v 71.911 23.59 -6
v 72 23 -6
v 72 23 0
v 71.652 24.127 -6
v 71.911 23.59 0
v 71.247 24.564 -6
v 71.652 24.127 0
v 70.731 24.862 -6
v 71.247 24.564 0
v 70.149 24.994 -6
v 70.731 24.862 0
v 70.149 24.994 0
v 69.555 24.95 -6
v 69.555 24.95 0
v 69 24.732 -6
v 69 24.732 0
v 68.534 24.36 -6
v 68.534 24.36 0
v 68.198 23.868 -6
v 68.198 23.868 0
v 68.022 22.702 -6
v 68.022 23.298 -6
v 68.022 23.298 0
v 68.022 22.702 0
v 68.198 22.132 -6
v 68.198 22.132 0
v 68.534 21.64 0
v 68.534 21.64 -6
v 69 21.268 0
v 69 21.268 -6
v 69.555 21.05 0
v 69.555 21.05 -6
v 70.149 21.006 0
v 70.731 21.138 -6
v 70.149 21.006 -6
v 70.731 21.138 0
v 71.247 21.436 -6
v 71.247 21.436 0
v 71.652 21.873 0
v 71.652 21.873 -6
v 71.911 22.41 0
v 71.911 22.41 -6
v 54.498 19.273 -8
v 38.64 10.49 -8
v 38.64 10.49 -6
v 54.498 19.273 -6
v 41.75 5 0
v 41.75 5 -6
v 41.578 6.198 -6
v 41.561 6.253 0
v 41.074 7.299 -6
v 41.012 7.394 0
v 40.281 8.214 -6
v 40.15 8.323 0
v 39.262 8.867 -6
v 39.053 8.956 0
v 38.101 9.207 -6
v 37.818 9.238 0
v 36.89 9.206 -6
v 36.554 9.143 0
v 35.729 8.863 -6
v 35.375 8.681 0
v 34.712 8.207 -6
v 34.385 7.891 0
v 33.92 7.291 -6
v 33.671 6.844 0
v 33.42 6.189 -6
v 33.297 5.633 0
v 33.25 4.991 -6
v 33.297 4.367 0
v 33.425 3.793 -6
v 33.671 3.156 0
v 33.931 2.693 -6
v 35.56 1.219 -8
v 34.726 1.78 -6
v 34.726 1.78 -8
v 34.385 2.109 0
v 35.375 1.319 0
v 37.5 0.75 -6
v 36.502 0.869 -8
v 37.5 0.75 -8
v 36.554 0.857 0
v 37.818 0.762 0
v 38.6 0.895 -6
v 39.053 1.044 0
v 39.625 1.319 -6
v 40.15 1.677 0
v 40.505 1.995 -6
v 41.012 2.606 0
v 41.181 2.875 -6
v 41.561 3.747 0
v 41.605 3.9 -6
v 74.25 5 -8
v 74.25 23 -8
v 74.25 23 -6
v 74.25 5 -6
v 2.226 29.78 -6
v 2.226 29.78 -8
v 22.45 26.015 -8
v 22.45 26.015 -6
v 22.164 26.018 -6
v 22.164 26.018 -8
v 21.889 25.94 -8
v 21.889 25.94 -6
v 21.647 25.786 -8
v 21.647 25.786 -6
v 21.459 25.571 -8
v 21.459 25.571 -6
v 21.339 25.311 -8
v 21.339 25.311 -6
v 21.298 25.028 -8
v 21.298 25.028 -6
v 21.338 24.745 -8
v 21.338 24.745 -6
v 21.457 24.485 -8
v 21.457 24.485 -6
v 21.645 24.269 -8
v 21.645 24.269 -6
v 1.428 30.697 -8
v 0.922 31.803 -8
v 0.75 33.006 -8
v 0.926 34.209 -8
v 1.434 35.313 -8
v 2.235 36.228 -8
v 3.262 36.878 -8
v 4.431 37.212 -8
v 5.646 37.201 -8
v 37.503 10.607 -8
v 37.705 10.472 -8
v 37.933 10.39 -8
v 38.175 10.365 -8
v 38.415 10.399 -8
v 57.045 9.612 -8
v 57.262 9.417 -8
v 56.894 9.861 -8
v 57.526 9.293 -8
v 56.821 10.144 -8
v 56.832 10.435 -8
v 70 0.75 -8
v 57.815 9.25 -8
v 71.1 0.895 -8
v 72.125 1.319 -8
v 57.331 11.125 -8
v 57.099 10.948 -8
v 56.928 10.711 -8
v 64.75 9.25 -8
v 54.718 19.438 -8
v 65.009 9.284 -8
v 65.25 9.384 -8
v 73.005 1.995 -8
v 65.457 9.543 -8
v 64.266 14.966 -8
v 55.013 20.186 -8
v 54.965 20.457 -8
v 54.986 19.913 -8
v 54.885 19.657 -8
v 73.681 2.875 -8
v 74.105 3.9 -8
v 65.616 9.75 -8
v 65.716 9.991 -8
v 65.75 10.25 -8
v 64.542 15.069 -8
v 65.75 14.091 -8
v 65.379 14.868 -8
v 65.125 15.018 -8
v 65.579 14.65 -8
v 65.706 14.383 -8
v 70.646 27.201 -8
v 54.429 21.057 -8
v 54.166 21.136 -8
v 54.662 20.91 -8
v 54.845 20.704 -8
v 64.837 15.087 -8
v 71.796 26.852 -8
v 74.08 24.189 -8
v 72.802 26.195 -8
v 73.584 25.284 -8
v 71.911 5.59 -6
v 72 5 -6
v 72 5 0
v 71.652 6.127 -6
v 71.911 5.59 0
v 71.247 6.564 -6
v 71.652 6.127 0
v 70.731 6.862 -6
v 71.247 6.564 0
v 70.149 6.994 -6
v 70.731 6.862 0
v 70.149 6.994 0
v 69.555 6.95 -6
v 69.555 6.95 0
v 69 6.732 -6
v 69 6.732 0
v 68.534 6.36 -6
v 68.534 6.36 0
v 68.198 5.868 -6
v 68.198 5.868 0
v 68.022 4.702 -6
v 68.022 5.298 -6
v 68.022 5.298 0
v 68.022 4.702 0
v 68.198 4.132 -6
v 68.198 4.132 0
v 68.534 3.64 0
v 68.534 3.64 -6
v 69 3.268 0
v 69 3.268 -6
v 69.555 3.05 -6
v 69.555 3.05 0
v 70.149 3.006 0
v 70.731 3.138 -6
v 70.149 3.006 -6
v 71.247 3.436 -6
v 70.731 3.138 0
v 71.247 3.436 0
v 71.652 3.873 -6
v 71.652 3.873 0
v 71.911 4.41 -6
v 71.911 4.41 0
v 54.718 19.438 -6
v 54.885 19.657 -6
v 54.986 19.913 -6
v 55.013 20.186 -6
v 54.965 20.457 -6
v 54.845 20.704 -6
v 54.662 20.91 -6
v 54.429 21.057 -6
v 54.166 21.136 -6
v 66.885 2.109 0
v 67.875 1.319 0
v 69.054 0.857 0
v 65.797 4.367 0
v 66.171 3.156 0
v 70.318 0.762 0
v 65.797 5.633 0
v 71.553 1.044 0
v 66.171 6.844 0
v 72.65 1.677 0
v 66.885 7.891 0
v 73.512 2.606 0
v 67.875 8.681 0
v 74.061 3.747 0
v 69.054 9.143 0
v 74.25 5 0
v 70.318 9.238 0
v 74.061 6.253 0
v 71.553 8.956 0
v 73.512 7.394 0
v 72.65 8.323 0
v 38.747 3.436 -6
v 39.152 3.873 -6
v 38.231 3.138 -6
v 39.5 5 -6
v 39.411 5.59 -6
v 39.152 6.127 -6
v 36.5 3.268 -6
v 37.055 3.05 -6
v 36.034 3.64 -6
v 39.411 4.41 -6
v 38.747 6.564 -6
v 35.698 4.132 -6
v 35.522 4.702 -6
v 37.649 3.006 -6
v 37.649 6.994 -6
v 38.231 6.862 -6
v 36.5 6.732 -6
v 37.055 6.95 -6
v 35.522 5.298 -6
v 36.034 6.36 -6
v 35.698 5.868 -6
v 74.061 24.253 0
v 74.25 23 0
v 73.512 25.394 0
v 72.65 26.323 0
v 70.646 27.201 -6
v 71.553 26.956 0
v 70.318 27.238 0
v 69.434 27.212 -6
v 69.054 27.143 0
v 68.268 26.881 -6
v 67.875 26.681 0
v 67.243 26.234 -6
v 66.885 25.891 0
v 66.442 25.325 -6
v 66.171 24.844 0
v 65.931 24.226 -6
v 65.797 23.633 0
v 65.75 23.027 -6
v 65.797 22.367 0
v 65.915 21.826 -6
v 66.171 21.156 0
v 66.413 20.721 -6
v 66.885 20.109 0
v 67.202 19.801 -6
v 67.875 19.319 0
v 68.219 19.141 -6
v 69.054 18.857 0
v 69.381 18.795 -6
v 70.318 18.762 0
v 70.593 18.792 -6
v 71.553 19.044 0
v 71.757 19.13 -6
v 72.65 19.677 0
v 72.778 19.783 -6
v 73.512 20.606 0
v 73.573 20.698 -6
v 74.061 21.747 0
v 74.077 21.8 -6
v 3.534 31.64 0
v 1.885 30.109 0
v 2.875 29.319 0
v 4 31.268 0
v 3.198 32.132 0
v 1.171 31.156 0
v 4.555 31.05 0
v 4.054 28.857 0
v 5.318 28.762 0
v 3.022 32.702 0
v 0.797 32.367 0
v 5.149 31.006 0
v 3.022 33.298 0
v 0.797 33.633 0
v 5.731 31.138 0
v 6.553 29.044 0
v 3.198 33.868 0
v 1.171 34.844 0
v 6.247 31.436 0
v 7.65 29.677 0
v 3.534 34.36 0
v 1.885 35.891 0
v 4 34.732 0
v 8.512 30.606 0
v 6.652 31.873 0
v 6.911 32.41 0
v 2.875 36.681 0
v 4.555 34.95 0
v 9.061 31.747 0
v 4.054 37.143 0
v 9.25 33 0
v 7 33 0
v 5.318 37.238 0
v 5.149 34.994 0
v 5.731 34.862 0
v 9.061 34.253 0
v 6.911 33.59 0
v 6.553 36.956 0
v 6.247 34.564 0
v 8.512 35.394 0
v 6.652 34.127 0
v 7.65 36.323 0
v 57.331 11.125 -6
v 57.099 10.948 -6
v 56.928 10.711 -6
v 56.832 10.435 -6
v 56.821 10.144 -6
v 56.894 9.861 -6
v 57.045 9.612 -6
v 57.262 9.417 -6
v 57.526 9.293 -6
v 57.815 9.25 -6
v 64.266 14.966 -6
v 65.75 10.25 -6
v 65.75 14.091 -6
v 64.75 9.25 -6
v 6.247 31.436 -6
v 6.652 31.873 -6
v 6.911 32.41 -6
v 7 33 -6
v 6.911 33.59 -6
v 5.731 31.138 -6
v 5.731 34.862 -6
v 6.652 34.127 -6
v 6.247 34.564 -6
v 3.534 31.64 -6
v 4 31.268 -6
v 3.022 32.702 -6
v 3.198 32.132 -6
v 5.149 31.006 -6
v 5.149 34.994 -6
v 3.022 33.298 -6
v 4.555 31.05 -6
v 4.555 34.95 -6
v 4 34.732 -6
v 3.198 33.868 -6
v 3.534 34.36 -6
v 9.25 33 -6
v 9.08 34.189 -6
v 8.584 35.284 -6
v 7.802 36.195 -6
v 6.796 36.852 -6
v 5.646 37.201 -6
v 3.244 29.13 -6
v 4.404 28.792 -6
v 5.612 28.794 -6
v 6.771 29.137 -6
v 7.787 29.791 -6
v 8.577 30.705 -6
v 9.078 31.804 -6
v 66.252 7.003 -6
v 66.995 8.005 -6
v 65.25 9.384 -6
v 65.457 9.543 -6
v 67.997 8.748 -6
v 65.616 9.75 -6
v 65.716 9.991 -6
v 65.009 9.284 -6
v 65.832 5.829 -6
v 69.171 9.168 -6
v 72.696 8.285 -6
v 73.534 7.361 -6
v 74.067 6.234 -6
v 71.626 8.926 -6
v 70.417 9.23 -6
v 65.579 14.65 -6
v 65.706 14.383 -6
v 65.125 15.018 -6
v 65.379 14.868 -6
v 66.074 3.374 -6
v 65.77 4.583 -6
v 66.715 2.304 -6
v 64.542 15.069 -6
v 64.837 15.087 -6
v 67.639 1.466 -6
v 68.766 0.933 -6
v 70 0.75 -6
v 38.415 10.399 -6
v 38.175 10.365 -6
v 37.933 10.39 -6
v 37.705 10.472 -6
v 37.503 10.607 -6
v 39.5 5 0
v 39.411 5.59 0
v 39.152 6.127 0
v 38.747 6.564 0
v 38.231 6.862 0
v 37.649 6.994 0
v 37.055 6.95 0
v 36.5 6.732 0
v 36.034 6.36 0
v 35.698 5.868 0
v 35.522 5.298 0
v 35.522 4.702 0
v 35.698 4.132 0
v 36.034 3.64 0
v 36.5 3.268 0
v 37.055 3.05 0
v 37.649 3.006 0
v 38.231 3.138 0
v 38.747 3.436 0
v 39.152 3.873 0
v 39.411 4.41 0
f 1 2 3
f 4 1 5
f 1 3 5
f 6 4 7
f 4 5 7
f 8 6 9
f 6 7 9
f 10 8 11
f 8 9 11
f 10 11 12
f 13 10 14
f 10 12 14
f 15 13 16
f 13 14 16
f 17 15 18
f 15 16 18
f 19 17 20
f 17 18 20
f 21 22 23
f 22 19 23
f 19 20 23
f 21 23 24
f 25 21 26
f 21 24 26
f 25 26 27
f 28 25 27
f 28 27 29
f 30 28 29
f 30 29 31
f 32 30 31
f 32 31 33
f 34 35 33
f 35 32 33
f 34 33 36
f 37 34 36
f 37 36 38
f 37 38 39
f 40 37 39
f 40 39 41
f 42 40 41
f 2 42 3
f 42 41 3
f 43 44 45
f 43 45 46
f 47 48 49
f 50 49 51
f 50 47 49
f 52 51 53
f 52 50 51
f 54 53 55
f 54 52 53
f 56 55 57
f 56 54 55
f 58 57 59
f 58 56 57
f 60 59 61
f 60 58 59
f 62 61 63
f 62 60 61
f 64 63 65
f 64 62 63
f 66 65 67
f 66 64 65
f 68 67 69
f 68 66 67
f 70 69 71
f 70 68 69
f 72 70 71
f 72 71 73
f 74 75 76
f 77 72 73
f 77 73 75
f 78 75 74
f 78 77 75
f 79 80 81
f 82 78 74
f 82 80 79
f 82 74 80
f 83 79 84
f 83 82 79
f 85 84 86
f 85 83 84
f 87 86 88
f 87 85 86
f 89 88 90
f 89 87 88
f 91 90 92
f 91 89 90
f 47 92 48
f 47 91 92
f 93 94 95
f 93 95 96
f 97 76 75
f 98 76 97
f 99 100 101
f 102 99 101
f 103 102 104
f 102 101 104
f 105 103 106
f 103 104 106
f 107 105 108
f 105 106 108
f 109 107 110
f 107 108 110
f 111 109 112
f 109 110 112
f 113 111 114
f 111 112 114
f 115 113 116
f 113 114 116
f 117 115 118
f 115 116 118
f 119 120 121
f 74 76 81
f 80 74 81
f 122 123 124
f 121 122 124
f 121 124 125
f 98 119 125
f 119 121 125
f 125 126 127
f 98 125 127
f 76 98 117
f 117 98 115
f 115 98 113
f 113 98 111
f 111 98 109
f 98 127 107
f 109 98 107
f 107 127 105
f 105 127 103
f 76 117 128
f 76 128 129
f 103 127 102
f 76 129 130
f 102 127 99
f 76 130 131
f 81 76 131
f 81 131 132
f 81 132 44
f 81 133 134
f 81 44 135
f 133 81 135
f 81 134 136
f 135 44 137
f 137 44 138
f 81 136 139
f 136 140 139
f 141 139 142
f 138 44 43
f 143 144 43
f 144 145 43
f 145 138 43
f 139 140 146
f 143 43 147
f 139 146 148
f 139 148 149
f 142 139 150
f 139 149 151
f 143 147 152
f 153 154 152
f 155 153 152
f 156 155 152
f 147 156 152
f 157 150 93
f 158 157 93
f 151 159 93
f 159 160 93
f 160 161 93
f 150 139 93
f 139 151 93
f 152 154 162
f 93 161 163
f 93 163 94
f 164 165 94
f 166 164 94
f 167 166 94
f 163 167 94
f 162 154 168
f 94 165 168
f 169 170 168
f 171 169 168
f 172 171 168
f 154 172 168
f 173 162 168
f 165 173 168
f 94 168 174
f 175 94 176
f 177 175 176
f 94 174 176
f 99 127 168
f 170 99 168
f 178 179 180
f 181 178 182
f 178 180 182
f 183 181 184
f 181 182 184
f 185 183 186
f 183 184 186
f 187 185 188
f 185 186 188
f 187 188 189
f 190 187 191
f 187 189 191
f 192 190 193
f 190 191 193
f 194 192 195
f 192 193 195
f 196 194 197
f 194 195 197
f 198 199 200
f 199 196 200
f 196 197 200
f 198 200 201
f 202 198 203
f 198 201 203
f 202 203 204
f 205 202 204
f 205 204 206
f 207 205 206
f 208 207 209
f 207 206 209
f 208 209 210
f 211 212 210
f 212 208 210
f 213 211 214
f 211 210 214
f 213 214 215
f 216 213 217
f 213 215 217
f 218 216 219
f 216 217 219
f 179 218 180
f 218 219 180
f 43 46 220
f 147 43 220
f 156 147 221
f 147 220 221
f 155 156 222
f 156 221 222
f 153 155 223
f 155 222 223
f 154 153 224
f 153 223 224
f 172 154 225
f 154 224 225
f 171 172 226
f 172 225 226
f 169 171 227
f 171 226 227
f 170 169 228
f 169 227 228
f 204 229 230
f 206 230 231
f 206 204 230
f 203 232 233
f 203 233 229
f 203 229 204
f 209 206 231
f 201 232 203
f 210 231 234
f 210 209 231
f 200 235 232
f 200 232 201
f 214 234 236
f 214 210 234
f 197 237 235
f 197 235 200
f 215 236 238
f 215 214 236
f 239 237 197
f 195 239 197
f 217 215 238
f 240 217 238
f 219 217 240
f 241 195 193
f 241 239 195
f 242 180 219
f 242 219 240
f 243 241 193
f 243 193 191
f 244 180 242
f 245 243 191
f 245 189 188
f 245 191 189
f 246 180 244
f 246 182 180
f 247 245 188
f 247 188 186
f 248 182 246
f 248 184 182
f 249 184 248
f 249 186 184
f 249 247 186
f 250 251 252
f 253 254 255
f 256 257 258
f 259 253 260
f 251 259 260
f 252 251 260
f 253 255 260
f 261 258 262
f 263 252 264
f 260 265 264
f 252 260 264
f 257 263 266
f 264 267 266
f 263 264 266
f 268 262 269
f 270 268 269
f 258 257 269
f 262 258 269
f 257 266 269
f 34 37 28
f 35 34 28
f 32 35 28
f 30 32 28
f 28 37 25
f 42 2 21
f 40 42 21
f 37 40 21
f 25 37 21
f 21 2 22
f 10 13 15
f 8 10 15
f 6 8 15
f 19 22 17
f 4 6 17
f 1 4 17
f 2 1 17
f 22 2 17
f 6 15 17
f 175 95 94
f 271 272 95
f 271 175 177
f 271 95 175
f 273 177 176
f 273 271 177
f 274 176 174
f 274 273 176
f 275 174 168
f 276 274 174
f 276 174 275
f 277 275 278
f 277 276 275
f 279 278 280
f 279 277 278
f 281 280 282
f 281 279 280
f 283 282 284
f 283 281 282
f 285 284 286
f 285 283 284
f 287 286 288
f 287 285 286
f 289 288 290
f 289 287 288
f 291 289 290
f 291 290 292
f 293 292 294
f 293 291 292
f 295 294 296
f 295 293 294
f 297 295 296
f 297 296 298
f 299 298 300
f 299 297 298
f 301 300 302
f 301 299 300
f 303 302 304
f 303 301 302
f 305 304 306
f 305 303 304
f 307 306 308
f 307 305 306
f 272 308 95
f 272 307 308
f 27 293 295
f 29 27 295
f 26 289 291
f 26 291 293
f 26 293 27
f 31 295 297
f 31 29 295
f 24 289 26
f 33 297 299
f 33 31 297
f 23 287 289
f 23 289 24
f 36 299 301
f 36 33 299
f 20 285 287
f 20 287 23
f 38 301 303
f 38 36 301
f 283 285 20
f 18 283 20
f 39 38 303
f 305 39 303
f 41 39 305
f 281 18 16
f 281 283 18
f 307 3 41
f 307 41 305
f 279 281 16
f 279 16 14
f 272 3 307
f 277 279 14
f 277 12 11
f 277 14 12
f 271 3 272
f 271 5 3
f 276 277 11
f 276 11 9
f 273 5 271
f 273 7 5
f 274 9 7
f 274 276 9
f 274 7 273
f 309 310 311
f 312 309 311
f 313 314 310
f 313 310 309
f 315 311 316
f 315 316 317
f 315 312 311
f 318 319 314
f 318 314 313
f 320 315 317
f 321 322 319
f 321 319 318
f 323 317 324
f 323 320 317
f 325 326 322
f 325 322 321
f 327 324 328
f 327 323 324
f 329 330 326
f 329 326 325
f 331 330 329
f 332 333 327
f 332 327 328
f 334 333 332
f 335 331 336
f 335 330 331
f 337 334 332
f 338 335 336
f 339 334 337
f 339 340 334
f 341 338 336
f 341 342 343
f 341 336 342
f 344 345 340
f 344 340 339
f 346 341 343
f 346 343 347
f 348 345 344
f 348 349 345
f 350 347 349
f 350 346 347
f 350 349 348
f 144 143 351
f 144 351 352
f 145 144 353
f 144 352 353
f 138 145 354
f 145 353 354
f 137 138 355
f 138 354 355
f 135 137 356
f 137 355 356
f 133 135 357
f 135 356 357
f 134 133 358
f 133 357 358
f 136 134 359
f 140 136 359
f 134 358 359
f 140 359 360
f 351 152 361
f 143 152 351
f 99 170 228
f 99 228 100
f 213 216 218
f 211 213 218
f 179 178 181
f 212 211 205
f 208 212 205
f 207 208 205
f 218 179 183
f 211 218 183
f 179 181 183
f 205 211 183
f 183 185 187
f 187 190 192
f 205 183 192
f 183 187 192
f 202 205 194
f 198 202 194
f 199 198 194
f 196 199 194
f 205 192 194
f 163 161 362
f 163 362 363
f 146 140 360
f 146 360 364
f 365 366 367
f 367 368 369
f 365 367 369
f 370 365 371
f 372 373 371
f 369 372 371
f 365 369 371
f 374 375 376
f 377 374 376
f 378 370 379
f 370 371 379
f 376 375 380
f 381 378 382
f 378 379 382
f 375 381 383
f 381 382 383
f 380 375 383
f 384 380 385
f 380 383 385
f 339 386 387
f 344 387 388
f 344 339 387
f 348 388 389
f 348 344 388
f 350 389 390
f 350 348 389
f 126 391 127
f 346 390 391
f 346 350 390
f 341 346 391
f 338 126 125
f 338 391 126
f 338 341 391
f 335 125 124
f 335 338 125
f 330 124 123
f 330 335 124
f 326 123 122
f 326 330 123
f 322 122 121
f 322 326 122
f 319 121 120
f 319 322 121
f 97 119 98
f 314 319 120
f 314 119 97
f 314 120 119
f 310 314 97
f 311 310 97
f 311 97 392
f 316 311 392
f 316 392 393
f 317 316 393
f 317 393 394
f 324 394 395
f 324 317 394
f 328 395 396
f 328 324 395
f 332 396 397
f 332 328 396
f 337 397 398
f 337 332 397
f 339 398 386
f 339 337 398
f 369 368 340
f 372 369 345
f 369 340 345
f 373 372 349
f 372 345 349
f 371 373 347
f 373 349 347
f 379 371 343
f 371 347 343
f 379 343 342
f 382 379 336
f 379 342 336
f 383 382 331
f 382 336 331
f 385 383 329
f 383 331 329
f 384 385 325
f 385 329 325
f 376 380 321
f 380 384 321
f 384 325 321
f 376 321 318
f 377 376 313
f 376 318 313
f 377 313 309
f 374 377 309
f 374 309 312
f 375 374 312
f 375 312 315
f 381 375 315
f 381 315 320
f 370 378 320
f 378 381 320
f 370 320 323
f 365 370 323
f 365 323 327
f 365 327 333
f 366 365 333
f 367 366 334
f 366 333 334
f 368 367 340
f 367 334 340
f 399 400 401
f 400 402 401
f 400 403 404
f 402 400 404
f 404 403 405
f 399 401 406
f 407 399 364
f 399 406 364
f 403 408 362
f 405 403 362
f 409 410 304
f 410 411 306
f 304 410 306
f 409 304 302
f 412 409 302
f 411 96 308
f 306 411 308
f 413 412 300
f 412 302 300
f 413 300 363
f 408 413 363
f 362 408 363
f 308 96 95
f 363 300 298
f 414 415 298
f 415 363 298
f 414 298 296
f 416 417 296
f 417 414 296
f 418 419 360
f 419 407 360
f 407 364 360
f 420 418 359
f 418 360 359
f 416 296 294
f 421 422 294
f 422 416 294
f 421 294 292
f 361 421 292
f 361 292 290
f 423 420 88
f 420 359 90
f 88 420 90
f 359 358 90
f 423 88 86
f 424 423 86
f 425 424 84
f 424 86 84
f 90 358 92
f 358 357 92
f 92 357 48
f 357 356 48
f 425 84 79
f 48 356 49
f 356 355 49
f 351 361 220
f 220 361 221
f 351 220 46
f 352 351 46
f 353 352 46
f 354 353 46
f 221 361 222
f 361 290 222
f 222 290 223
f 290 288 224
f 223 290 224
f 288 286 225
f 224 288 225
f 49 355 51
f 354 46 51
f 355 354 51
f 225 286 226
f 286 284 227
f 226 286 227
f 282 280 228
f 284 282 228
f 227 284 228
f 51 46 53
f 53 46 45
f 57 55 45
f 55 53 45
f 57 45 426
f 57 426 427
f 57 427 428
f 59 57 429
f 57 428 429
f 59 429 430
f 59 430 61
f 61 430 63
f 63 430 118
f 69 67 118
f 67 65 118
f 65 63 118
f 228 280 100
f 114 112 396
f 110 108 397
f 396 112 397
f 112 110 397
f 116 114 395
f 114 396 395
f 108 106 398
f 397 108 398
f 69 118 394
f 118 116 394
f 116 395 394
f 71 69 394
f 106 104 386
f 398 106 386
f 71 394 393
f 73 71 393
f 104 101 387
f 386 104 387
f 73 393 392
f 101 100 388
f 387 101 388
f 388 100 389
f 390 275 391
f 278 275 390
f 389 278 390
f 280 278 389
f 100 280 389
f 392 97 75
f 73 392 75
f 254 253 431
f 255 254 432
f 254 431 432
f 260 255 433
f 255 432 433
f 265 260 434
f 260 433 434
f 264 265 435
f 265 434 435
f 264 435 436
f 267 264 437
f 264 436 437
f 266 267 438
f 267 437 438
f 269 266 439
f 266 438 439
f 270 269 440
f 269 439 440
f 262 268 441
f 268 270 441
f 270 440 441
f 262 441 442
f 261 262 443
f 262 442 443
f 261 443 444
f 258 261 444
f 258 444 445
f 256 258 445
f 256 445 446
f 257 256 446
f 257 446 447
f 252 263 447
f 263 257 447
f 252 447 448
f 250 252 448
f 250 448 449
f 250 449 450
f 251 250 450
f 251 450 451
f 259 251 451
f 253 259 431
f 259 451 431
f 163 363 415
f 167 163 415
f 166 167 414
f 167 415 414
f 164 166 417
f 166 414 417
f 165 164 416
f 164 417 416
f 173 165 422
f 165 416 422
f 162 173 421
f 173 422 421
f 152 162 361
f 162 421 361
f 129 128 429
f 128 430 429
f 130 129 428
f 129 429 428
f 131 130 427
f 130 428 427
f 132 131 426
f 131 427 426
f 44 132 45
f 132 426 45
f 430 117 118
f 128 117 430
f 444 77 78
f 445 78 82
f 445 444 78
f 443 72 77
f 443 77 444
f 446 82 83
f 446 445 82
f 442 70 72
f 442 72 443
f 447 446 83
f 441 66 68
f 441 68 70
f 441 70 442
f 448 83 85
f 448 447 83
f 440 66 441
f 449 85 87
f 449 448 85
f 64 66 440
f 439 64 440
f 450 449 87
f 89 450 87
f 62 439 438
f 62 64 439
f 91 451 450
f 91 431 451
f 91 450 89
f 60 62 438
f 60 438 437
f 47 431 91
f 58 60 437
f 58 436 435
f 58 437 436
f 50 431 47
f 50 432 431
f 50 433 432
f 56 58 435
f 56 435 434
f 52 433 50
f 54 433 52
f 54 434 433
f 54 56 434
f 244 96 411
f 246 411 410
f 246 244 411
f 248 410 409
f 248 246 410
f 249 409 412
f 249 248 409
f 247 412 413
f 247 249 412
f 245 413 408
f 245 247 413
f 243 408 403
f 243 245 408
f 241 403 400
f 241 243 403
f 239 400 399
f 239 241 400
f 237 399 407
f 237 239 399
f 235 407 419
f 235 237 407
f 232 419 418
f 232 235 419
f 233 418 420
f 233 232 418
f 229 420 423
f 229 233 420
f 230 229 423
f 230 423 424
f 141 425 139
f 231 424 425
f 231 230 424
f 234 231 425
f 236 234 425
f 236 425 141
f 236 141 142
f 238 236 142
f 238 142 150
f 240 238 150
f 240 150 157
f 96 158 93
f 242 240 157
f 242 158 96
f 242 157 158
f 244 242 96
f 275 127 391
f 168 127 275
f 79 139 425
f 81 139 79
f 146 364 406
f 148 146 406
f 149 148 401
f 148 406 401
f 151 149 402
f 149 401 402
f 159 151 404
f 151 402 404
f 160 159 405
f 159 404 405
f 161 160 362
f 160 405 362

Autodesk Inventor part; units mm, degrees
ref_plane "YZ Plane" through (0, 0, 0) normal (1, 0, 0) x (0, 1, 0)
ref_plane "XZ Plane" through (0, 0, 0) normal (0, 1, 0) x (-1, 0, 0)
ref_plane "XY Plane" through (0, 0, 0) normal (0, 0, 1) x (1, 0, 0)
sketch "Skizze1" plane through (0, 0, 0) normal (0, 0, 1) x (1, 0, 0)
  circle A0 centre (5, 33) radius 4.25
  circle A1 centre (37.5, 5) radius 4.25
  circle A2 centre (70, 23) radius 4.25
  circle A3 centre (70, 5) radius 4.25
  circle A4 centre (5, 33) radius 2
  circle A5 centre (37.5, 5) radius 2
  circle A6 centre (70, 5) radius 2
  circle A7 centre (70, 23) radius 2
  point P0 (0, 0)
  dimension "d0" = 8.5
  dimension "d1" = 33
  dimension "d2" = 5
  dimension "d3" = 8.5
  dimension "d4" = 5
  dimension "d5" = 37.5
  dimension "d6" = 8.5
  dimension "d7" = 70
  dimension "d8" = 23
  dimension "d9" = 8.5
  dimension "d10" = 70
  dimension "d11" = 5
  dimension "d12" = 4
  dimension "d13" = 4
  dimension "d14" = 4
  dimension "d15" = 4
extrude "Extrusion1" add sketch "Skizze1" against normal blind 8
sketch "Skizze2" plane through (70, 23, -8) normal (0, 0, -1) x (-1, 0, 0)
  circle A0 centre (0, 0) radius 2 projected
  circle A1 centre (0, 0) radius 4.25 projected
  circle A2 centre (0, 0) radius 2 projected
  circle A3 centre (0, -18) radius 4.25 projected
  circle A4 centre (0, -18) radius 2 projected
  circle A5 centre (32.5, -18) radius 4.25 projected
  circle A6 centre (32.5, -18) radius 2 projected
  circle A7 centre (65, 10) radius 4.25 projected
  circle A8 centre (65, 10) radius 2 projected
  line L0 (0, 0) -> (0, -18) construction
  line L1 (-4.25, 0) -> (-4.25, -18)
  line L2 (4.25, -18) -> (4.25, 0)
  arc A9 (4.25, 0) -> (-4.25, 0) centre (0, 0) ccw
  arc A10 (-4.25, -18) -> (4.25, -18) centre (0, -18) ccw
  line L3 (0, -18) -> (32.5, -18) construction
  line L4 (0, -22.25) -> (32.5, -22.25)
  line L5 (32.5, -13.75) -> (0, -13.75)
  arc A11 (0, -13.75) -> (0, -22.25) centre (0, -18) ccw
  arc A12 (32.5, -22.25) -> (32.5, -13.75) centre (32.5, -18) ccw
  circle A13 centre (32.5, -18) radius 2 projected
  line L6 (65, 10) -> (32.5, -18) construction
  line L7 (62.226, 13.2198) -> (29.726, -14.7802)
  line L8 (35.274, -21.2198) -> (67.774, 6.7802)
  arc A14 (67.774, 6.7802) -> (62.226, 13.2198) centre (65, 10) ccw
  arc A15 (29.726, -14.7802) -> (35.274, -21.2198) centre (32.5, -18) ccw
  line L9 (0, 0) -> (32.5, -18) construction
  line L10 (-2.0591, -3.7179) -> (30.4409, -21.7179)
  line L11 (34.5591, -14.2821) -> (2.0591, 3.7179)
  arc A16 (2.0591, 3.7179) -> (-2.0591, -3.7179) centre (0, 0) ccw
  arc A17 (30.4409, -21.7179) -> (34.5591, -14.2821) centre (32.5, -18) ccw
  line L12 (0, 0) -> (65, 10) construction
  line L13 (0.6462, -4.2006) -> (65.6462, 5.7994)
  line L14 (64.3538, 14.2006) -> (-0.6462, 4.2006)
  arc A18 (-0.6462, 4.2006) -> (0.6462, -4.2006) centre (0, 0) ccw
  arc A19 (65.6462, 5.7994) -> (64.3538, 14.2006) centre (65, 10) ccw
  point P0 (70, -23)
  point P1 (0, -9)
  point P2 (16.25, -18)
  point P3 (48.75, -4)
  point P4 (16.25, -9)
  point P5 (32.5, 5)
  point P6 (50.9971, 3.5457)
  point P7 (31.9691, -12.8477)
  point P8 (12.9411, -2.3091)
  point P9 (-4.25, 0)
  point P10 (-4.25, -18)
  point P11 (4.25, -13.75)
  point P12 (4.25, -7.2121)
  point P13 (16.0545, -13.75)
extrude "Extrusion2" add sketch "Skizze2" against normal blind 2 contours A0 | L2 L13 A1 | A1 L11 L13 L2 | A1 L14 A7 L7 L13 L11 | L13 L2 L10 A1 | L13 L11 L7 L5 L10 L2 | L10 L2 L5 A3 L1 A1 | L11 A5 L5 L7 | L7 L13 A7 L8 A5 L11 | L7 A7 L13 | L5 L10 A5 L4 A3 L2 | L2 A3 L5 | L5 L7 A5 L10 | L5 A5 L7 | A4 | A6 | A8
fillet "Rundung1" radius 1 6 edges at (19.0029, 26.5457, -7) (38.0309, 10.1523, -7) (57.0589, 20.6909, -7) (53.9455, 9.25, -7) (65.75, 9.25, -7) (65.75, 15.7879, -7)
properties part number "200_Frame_Internal"
